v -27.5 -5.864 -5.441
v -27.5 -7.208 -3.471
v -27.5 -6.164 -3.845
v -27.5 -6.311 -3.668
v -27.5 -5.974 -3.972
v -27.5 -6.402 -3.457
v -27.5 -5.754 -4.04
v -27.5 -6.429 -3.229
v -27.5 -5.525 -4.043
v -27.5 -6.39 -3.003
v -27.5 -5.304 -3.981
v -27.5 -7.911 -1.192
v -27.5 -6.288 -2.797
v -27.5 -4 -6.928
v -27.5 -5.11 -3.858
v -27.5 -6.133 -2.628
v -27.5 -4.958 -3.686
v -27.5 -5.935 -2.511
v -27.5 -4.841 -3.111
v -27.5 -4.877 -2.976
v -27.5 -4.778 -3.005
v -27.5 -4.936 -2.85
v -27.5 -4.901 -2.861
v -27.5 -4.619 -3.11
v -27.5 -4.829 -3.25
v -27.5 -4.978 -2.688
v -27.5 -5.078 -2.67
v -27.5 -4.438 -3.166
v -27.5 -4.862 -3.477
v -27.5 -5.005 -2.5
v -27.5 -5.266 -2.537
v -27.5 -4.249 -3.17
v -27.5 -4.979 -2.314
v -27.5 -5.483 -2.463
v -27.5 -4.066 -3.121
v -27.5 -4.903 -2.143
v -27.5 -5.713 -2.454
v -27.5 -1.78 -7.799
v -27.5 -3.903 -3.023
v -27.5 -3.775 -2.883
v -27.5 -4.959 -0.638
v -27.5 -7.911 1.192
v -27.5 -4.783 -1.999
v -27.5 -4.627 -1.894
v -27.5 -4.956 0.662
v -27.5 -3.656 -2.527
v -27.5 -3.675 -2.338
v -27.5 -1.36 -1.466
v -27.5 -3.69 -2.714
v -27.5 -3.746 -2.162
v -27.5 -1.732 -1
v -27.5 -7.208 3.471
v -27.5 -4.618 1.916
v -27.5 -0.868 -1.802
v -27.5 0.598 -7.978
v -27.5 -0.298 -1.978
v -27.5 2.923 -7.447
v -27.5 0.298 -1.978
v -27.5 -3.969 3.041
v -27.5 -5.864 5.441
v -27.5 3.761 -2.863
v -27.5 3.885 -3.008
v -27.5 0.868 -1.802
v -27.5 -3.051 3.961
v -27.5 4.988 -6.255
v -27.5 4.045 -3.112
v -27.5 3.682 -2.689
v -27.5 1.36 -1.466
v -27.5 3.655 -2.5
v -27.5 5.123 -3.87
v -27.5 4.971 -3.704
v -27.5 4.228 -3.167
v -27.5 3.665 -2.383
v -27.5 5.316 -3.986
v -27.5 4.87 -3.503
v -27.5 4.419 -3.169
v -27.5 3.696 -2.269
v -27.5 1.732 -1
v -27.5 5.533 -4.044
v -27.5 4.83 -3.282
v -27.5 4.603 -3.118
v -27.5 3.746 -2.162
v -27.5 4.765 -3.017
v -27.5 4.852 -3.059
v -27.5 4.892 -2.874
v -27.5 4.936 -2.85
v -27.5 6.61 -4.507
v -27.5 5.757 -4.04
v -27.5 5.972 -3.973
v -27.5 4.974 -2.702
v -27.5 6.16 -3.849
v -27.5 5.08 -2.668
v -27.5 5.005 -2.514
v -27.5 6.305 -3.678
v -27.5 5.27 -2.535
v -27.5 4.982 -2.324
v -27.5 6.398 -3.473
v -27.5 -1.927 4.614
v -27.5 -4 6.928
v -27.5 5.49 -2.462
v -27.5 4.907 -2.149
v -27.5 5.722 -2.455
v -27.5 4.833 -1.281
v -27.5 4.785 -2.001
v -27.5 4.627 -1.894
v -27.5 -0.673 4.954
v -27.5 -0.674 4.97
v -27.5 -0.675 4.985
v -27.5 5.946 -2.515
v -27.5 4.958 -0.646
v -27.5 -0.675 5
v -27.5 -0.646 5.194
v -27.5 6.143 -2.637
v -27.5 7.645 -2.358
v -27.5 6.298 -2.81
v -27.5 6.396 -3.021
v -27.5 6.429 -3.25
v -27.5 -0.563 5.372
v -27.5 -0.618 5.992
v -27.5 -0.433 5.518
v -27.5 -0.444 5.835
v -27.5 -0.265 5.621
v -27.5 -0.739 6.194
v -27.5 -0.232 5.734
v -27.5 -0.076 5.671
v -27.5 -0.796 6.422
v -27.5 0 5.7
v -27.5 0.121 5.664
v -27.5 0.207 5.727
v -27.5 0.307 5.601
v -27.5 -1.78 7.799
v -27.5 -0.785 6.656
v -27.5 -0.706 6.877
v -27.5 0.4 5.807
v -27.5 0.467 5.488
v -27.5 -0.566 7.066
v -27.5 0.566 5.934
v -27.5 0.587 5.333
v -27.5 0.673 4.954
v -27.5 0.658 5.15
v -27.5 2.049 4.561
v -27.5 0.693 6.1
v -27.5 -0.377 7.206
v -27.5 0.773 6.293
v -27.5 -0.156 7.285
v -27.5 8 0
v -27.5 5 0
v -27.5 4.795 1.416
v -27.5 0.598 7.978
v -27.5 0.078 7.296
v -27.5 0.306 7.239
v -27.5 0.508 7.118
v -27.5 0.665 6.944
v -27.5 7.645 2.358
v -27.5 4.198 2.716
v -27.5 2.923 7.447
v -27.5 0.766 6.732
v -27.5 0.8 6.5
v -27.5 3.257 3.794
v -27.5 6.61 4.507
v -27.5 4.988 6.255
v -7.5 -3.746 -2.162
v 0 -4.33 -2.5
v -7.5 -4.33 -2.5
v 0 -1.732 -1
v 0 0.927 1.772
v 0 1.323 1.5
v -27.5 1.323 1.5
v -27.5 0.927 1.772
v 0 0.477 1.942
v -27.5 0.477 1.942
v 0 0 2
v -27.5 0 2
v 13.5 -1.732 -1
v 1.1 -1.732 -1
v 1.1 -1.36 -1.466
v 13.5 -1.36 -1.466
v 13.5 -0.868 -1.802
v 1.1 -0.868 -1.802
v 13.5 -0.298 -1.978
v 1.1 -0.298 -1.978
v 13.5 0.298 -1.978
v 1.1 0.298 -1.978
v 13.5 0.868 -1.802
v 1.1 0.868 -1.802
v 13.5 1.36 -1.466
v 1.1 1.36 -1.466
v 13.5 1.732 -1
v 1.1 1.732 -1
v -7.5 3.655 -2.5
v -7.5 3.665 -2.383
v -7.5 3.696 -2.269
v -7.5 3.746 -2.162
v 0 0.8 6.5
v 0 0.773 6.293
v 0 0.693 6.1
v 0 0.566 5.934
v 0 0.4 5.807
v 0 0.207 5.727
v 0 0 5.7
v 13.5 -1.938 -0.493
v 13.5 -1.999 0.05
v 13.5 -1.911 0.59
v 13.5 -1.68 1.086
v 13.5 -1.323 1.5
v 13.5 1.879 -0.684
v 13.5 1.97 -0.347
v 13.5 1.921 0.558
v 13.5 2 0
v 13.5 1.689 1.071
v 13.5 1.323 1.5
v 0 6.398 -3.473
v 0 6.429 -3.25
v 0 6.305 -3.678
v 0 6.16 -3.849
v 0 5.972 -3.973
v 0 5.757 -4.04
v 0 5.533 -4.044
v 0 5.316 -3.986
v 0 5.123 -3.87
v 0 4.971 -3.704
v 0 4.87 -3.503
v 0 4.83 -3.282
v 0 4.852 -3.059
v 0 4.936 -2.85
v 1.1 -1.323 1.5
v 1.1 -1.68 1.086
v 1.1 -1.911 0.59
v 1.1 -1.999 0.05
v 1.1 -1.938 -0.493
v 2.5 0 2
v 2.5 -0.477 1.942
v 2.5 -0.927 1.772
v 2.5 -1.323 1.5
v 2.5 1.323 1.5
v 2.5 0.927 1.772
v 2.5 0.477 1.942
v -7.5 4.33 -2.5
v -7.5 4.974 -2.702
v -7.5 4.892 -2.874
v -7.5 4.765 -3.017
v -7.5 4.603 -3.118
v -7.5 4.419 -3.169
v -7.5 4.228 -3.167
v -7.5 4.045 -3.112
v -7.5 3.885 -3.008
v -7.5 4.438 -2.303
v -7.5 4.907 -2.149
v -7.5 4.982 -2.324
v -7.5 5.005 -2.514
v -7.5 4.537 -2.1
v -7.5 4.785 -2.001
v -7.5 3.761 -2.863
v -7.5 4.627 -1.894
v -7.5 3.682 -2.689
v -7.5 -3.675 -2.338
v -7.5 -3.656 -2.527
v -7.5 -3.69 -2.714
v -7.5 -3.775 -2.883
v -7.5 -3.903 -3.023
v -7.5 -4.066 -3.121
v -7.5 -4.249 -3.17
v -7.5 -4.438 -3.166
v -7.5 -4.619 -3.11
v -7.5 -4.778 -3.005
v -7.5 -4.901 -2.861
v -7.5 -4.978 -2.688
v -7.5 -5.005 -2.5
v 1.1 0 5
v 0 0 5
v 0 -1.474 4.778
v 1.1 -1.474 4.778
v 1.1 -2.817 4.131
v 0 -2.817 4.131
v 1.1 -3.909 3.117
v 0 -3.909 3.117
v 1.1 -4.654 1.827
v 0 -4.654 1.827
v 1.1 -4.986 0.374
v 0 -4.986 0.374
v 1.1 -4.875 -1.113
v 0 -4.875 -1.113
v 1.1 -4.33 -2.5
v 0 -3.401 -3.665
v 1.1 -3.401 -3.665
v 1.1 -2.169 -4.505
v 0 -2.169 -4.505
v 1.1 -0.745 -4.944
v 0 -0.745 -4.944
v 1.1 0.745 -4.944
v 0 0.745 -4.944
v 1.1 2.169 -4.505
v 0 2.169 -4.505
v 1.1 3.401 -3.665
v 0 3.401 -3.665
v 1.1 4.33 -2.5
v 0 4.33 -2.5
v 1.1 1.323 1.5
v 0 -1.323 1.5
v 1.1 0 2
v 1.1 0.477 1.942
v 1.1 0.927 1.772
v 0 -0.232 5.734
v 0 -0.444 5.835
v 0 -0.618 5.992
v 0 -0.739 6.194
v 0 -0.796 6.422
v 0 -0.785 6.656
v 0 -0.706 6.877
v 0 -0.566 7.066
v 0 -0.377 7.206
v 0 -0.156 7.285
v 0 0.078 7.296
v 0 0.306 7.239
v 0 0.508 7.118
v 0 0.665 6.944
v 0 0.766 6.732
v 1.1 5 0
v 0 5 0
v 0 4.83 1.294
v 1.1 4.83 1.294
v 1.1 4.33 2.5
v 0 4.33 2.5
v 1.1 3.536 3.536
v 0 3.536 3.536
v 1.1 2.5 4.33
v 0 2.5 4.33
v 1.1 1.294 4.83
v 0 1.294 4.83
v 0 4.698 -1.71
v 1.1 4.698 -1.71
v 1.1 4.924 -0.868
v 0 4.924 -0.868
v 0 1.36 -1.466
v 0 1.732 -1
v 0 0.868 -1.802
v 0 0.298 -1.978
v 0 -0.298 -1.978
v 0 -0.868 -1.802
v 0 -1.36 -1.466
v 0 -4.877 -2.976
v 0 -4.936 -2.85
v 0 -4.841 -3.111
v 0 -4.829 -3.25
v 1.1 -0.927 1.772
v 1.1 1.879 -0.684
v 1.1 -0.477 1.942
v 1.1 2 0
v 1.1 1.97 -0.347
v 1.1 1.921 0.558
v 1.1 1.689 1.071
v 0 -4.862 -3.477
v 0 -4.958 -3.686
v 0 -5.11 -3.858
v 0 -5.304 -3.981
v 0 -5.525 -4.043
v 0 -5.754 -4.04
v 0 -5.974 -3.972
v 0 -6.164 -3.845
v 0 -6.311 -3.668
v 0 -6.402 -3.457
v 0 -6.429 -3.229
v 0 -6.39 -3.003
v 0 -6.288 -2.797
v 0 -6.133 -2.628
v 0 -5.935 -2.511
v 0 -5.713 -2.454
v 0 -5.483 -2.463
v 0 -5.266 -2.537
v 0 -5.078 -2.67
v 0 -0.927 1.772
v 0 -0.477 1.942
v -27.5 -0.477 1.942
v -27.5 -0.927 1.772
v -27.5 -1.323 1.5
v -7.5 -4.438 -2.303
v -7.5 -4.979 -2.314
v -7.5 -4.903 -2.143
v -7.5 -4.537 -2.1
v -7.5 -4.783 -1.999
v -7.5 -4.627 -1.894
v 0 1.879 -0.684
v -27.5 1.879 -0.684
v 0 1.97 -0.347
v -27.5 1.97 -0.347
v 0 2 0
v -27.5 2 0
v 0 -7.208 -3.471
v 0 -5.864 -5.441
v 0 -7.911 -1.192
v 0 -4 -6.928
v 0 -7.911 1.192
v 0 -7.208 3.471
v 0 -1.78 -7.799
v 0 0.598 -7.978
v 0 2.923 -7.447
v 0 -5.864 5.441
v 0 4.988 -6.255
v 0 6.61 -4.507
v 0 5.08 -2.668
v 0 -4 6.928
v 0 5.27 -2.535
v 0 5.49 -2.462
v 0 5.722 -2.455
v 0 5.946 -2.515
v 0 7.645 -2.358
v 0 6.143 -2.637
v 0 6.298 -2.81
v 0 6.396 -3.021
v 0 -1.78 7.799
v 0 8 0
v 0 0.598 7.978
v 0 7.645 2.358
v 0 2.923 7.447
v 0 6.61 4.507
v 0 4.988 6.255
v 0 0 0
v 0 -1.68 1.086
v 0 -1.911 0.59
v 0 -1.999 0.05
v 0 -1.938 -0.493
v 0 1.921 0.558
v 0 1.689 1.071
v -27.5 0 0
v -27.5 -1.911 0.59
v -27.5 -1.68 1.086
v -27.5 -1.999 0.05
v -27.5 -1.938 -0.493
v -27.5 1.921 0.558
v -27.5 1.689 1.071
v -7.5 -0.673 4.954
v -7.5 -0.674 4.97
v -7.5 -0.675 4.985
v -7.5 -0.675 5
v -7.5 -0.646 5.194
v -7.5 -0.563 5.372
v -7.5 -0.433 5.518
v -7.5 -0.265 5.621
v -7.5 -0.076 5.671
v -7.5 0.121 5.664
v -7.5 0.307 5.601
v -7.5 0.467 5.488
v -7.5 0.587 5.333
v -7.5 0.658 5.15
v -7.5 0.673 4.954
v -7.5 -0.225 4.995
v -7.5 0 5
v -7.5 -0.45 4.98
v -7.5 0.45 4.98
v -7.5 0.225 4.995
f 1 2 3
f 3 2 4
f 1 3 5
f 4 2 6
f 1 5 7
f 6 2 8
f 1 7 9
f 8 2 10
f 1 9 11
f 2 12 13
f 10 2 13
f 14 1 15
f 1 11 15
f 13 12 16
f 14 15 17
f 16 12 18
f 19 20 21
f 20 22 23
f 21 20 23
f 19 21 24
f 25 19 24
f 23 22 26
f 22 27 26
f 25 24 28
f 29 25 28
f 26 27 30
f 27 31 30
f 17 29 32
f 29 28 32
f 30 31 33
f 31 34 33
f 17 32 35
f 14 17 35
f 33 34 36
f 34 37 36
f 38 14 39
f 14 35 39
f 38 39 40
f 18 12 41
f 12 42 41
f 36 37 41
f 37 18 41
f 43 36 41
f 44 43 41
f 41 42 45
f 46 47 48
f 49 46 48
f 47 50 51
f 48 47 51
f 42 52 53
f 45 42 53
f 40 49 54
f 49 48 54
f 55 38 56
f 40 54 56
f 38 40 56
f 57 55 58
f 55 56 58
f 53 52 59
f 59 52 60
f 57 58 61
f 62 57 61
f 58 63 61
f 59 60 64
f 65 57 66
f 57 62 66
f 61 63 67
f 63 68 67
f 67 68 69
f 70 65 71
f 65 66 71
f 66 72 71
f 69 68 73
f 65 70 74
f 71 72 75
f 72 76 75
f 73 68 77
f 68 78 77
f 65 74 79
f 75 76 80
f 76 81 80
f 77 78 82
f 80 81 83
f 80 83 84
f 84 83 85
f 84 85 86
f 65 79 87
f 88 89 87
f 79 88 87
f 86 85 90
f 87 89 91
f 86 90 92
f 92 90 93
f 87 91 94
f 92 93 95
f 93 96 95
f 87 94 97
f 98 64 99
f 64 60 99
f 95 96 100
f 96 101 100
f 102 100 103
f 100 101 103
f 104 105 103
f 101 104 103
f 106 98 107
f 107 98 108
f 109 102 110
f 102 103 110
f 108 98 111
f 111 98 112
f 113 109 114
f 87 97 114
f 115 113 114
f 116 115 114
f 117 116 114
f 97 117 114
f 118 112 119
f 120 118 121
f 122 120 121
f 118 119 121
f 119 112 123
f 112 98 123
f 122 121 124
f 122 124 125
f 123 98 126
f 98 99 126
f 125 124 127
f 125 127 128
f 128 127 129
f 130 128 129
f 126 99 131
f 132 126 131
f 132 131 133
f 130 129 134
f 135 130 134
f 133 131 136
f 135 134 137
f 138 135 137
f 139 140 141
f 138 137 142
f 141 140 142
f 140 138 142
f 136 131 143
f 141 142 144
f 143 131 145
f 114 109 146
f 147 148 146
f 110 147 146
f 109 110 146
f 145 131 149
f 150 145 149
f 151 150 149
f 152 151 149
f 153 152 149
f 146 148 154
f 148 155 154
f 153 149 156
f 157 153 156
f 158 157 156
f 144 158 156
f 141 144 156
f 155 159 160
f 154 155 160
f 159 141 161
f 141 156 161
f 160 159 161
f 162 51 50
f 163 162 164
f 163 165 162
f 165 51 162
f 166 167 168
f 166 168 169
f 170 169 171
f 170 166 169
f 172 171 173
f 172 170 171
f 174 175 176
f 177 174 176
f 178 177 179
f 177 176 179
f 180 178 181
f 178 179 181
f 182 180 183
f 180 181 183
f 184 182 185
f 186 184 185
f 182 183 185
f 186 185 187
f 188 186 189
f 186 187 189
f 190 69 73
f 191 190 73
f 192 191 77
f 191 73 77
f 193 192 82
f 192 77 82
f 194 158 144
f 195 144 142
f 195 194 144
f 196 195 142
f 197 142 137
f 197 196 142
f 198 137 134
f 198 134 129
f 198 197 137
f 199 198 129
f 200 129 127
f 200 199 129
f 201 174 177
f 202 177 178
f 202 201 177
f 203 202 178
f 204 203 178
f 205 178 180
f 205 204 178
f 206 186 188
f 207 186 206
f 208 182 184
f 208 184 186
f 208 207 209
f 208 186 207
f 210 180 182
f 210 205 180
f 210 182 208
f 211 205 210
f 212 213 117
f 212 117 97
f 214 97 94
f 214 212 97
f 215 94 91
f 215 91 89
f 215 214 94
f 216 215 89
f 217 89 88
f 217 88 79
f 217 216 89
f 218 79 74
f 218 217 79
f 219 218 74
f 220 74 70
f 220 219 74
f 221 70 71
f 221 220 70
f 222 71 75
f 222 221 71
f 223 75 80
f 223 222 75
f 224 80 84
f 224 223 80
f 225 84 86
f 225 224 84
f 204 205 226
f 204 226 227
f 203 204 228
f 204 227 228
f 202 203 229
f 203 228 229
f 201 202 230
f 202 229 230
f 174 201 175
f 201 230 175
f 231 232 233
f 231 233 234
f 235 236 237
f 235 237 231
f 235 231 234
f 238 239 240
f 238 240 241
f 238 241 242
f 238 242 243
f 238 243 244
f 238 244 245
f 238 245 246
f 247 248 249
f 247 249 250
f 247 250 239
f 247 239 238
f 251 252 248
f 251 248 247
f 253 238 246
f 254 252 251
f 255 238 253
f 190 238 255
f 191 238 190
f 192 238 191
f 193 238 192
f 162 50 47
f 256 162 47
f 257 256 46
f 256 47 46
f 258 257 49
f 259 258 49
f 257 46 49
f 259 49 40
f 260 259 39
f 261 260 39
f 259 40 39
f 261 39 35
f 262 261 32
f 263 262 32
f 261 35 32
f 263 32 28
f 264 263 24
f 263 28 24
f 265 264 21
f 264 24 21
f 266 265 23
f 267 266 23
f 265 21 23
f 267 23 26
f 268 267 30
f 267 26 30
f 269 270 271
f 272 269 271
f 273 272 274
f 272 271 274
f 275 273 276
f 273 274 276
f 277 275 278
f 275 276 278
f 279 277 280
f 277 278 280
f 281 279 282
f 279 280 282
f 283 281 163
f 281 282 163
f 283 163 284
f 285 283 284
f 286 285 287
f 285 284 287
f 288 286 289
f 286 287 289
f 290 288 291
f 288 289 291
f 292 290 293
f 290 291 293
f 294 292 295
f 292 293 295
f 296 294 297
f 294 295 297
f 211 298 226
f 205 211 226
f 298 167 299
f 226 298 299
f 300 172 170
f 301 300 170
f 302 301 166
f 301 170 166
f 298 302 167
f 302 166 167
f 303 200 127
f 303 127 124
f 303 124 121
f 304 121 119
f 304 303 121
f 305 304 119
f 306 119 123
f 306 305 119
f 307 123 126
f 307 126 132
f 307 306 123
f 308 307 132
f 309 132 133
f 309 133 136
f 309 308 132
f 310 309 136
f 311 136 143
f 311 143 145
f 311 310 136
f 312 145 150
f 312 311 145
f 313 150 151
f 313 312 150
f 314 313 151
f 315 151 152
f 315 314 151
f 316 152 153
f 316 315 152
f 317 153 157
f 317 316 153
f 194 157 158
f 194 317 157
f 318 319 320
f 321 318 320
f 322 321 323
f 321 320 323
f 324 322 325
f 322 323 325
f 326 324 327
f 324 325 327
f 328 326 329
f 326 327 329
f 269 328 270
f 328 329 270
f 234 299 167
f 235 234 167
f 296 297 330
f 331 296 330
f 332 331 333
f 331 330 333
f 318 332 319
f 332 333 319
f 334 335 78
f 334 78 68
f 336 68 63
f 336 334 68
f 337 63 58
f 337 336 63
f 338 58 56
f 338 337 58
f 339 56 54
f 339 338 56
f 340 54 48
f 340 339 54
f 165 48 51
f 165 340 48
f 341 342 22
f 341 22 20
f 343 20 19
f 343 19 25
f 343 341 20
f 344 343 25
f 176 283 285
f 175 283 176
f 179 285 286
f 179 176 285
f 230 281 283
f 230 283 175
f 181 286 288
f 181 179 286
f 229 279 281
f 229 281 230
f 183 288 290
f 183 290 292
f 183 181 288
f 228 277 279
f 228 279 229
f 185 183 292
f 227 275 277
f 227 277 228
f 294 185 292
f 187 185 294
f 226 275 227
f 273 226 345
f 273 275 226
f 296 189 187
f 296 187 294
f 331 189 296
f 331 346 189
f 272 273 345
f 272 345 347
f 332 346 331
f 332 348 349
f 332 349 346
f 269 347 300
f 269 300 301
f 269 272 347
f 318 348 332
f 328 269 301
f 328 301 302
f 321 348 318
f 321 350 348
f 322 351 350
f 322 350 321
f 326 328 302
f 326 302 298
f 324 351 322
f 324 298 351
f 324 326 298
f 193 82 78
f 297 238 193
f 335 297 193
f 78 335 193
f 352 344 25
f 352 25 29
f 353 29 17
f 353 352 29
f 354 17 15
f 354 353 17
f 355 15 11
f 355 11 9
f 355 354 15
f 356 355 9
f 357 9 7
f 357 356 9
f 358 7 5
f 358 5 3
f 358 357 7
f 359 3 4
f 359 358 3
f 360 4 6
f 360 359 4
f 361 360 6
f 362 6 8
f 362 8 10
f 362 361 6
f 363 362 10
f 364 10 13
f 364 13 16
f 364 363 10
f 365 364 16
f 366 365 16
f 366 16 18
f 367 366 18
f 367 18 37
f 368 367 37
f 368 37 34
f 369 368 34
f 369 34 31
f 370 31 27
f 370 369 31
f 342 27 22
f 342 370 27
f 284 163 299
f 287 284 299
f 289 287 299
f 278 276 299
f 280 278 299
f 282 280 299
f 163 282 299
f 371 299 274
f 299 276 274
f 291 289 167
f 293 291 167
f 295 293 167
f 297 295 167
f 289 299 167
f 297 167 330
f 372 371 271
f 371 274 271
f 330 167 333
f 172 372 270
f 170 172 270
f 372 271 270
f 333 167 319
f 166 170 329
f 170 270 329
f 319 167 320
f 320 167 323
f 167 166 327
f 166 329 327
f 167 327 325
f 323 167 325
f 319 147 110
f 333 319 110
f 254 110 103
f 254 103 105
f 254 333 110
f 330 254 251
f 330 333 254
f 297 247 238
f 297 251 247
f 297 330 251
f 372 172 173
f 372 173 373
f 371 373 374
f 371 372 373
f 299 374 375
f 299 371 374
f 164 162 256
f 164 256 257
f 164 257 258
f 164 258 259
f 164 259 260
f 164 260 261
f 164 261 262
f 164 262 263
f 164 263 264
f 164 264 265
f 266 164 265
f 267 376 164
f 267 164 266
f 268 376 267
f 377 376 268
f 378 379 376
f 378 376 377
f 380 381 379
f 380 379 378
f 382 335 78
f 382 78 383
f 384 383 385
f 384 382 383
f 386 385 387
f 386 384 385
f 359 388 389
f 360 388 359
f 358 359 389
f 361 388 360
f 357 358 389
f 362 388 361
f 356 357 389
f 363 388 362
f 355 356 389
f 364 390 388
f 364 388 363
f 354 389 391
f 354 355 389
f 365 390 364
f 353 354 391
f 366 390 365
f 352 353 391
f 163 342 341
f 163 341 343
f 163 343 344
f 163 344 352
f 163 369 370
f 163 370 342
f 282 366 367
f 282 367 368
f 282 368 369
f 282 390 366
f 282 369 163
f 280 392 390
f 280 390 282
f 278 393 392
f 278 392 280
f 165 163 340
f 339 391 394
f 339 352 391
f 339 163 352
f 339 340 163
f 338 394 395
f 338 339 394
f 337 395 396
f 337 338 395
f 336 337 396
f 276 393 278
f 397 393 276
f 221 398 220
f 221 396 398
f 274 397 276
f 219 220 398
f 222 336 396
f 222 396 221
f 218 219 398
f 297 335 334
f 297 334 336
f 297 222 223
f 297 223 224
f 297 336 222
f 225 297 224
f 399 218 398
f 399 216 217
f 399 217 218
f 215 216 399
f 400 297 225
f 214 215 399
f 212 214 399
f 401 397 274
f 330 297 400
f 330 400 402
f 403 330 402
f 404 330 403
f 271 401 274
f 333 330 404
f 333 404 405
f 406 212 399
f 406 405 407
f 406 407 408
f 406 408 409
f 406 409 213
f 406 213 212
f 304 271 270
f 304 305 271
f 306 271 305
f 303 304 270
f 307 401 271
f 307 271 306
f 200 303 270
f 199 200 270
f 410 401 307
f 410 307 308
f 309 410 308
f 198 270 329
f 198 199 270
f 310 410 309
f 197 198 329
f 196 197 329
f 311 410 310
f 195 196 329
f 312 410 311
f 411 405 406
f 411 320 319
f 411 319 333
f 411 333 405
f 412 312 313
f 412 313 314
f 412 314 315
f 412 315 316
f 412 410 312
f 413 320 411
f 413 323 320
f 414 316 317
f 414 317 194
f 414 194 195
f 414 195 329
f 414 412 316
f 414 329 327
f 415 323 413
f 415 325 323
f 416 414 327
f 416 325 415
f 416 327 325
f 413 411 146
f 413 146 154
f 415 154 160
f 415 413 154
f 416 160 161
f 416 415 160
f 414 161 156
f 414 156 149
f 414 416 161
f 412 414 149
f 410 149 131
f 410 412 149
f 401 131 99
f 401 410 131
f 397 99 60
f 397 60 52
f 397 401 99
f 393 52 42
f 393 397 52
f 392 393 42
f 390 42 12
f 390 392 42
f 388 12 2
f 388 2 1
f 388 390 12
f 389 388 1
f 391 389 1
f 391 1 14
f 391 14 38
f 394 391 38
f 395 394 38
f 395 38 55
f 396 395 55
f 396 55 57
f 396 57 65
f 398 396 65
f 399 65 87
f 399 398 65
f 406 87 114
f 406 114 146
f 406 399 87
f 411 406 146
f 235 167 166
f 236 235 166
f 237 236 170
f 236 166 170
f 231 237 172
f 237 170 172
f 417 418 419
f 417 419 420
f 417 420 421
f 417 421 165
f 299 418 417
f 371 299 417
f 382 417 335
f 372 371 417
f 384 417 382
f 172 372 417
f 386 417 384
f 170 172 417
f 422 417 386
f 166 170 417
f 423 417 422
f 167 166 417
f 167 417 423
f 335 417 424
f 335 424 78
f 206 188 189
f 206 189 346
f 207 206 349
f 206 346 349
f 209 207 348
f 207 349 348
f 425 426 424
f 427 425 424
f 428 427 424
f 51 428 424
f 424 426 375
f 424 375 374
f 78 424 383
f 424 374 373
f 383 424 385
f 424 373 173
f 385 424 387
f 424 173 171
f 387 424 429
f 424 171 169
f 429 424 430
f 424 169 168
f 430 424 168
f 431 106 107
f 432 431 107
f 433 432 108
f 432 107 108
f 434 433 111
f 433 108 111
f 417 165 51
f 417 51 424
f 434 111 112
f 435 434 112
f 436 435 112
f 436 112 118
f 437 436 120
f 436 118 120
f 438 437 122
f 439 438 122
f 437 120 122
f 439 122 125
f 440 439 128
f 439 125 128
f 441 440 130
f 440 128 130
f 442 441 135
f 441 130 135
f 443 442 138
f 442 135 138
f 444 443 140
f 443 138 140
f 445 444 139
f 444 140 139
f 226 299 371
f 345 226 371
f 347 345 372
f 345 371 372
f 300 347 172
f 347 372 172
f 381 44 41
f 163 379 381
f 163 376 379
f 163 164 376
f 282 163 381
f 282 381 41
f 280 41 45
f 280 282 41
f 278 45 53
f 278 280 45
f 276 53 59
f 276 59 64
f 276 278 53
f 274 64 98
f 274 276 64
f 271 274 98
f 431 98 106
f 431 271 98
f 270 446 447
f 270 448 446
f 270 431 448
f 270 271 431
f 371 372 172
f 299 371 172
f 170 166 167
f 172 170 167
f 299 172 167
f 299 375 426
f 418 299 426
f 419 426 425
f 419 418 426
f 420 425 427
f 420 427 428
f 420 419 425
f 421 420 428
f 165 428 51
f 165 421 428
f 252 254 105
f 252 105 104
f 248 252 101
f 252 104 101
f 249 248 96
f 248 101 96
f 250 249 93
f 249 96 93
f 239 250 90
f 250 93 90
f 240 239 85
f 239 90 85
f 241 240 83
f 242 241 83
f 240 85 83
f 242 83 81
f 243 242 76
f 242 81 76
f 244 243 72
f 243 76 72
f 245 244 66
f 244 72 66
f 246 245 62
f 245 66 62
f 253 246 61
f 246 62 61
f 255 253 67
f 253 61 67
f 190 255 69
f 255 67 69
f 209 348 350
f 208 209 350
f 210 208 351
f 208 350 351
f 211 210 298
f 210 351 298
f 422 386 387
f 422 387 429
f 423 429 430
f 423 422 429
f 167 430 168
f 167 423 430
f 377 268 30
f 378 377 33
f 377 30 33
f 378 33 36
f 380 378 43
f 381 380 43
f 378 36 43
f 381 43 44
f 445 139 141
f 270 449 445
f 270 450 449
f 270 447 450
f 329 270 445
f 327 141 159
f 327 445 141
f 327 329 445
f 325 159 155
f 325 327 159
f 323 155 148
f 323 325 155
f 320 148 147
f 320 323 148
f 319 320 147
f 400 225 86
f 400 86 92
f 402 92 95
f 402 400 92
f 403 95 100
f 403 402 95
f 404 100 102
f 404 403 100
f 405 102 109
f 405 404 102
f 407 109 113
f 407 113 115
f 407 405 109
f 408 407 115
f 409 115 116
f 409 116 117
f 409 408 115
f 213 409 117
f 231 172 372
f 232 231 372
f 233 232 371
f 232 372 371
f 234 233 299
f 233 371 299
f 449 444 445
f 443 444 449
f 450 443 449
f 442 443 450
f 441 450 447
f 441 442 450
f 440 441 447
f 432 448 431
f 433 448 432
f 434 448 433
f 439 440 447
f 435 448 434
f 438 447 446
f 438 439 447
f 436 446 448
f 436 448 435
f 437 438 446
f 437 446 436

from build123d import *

# Parameters (mm, degrees)
F1_DEPTH = 13.5
F2_DEPTH = 1.1
F0_R     = 8
F3_DEPTH = 27.5
F6_DEPTH = 20
F7_DEPTH = 2.5


# Not quite as in the source:
# - a feature of the source that left no trace in its solid (it failed there, or was rolled back) is left out


with BuildPart() as f1:
    # F0 (on Right) → F1 (new body)
    with BuildSketch(Plane.YZ):
        with BuildLine():
            ThreePointArc((-1.3228756555, 1.5), (-1.9737385652, 0.323041911), (-1.7320508076, -1))
            Line((-1.7320508076, -1), (0, 0))
            Line((0, 0), (0, 1.5))
            Line((0, 1.5), (-1.3228756555, 1.5))
        make_face()
        with BuildLine():
            Line((0, 0), (1.7320508076, -1))
            ThreePointArc((1.7320508076, -1), (1.9318516526, -0.5176380902), (2, 0))
            ThreePointArc((2, 0), (1.8228756555, 0.8228756555), (1.3228756555, 1.5))
            Line((1.3228756555, 1.5), (0, 1.5))
            Line((0, 1.5), (0, 0))
        make_face()
        with BuildLine():
            ThreePointArc((-1.7320508076, -1), (0, -2), (1.7320508076, -1))
            Line((1.7320508076, -1), (0, 0))
            Line((0, 0), (-1.7320508076, -1))
        make_face()
    extrude(amount=F1_DEPTH)

    # F0 (on Right) → F2 (join)
    with BuildSketch(Plane.YZ):
        with BuildLine():
            Line((0, 2), (0, 5))
            ThreePointArc((0, 5), (-4.3301270189, 2.5), (-4.3301270189, -2.5))
            Line((-4.3301270189, -2.5), (-1.7320508076, -1))
            ThreePointArc((-1.7320508076, -1), (-1.9737385652, 0.323041911), (-1.3228756555, 1.5))
            ThreePointArc((-1.3228756555, 1.5), (-0.7071067812, 1.8708286934), (0, 2))
        make_face()
        with BuildLine():
            ThreePointArc((-4.3301270189, -2.5), (0, -5), (4.3301270189, -2.5))
            Line((4.3301270189, -2.5), (1.7320508076, -1))
            ThreePointArc((1.7320508076, -1), (0, -2), (-1.7320508076, -1))
            Line((-1.7320508076, -1), (-4.3301270189, -2.5))
        make_face()
        with BuildLine():
            ThreePointArc((4.3301270189, -2.5), (4.8296291314, -1.2940952255), (5, 0))
            ThreePointArc((5, 0), (3.5355339059, 3.5355339059), (0, 5))
            Line((0, 5), (0, 2))
            ThreePointArc((0, 2), (0.7071067812, 1.8708286934), (1.3228756555, 1.5))
            ThreePointArc((1.3228756555, 1.5), (1.8228756555, 0.8228756555), (2, 0))
            ThreePointArc((2, 0), (1.9318516526, -0.5176380902), (1.7320508076, -1))
            Line((1.7320508076, -1), (4.3301270189, -2.5))
        make_face()
    extrude(amount=F2_DEPTH)


with BuildPart() as f3:
    # F0 (on Right) → F3 (new body)
    with BuildSketch(Plane.YZ):
        Circle(F0_R)
        with BuildLine():
            ThreePointArc((-4.8291651246, -3.25), (-6.4019057856, -3.4570552361), (-4.9363448016, -2.85))
            ThreePointArc((-4.9363448016, -2.85), (-4.8564244636, -3.0429447639), (-4.8291651246, -3.25))
        make_face(mode=Mode.SUBTRACT)
        with BuildLine():
            ThreePointArc((6.4291651246, -3.25), (5.4221098885, -4.022740661), (4.9363448016, -2.85))
            ThreePointArc((4.9363448016, -2.85), (5.8362203607, -2.477259339), (6.4291651246, -3.25))
        make_face(mode=Mode.SUBTRACT)
        with BuildLine():
            ThreePointArc((0, 5), (3.5355339059, 3.5355339059), (5, 0))
            ThreePointArc((5, 0), (4.8296291314, -1.2940952255), (4.3301270189, -2.5))
            ThreePointArc((4.3301270189, -2.5), (0, -5), (-4.3301270189, -2.5))
            ThreePointArc((-4.3301270189, -2.5), (-4.3301270189, 2.5), (0, 5))
        make_face(mode=Mode.SUBTRACT)
        with BuildLine():
            ThreePointArc((0.8, 6.5), (0.5656854249, 5.9343145751), (0, 5.7))
            ThreePointArc((0, 5.7), (-0.5656854249, 7.0656854249), (0.8, 6.5))
        make_face(mode=Mode.SUBTRACT)
        with BuildLine():
            ThreePointArc((-4.3301270189, -2.5), (0, -5), (4.3301270189, -2.5))
            Line((4.3301270189, -2.5), (1.7320508076, -1))
            ThreePointArc((1.7320508076, -1), (0, -2), (-1.7320508076, -1))
            Line((-1.7320508076, -1), (-4.3301270189, -2.5))
        make_face()
    extrude(amount=-F3_DEPTH)

    # F4 (on face) → F6 (cut)
    with BuildSketch(Plane(origin=(-27.5, 0, 0), x_dir=(0, -1, 0), z_dir=(-1, 0, 0))):
        with BuildLine():
            ThreePointArc((-3.7455598714, -2.1625), (-4.1335062489, -1.8542715177), (-4.6273989915, -1.8939848399))
            ThreePointArc((-4.6273989915, -1.8939848399), (-4.4890011863, -2.2020146116), (-4.3301270189, -2.5))
            Line((-4.3301270189, -2.5), (-3.7455598714, -2.1625))
        make_face()
        with BuildLine():
            ThreePointArc((-4.3301270189, -2.5), (-4.4890011863, -2.2020146116), (-4.6273989915, -1.8939848399))
            ThreePointArc((-4.6273989915, -1.8939848399), (-4.6871749278, -3.0728366178), (-3.6551270189, -2.5))
            ThreePointArc((-3.6551270189, -2.5), (-3.6781270862, -2.3252971446), (-3.7455598714, -2.1625))
            Line((-3.7455598714, -2.1625), (-4.3301270189, -2.5))
        make_face()
        with BuildLine():
            ThreePointArc((0.67346051, 4.9544375), (0, 5), (-0.67346051, 4.9544375))
            ThreePointArc((-0.67346051, 4.9544375), (0, 4.325), (0.67346051, 4.9544375))
        make_face()
        with BuildLine():
            ThreePointArc((0.67346051, 4.9544375), (0.6746150177, 4.9772057494), (0.675, 5))
            ThreePointArc((0.675, 5), (-0.0227942506, 5.6746150177), (-0.67346051, 4.9544375))
            ThreePointArc((-0.67346051, 4.9544375), (0, 5), (0.67346051, 4.9544375))
        make_face()
        with BuildLine():
            ThreePointArc((4.3301270189, -2.5), (4.4890011863, -2.2020146116), (4.6273989915, -1.8939848399))
            ThreePointArc((4.6273989915, -1.8939848399), (4.1335062489, -1.8542715177), (3.7455598714, -2.1625))
            Line((3.7455598714, -2.1625), (4.3301270189, -2.5))
        make_face()
        with BuildLine():
            ThreePointArc((5.0051270189, -2.5), (4.9029636368, -2.1429520911), (4.6273989915, -1.8939848399))
            ThreePointArc((4.6273989915, -1.8939848399), (4.4890011863, -2.2020146116), (4.3301270189, -2.5))
            Line((4.3301270189, -2.5), (3.7455598714, -2.1625))
            ThreePointArc((3.7455598714, -2.1625), (4.1554241635, -3.1519999327), (5.0051270189, -2.5))
        make_face()
    extrude(amount=-F6_DEPTH, mode=Mode.SUBTRACT)


with BuildPart() as f3b:
    # F0 (on Right) → F3, piece 2 (new body)
    with BuildSketch(Plane.YZ):
        with BuildLine():
            Line((0, 1.5), (0, 2))
            ThreePointArc((0, 2), (-0.7071067812, 1.8708286934), (-1.3228756555, 1.5))
            Line((-1.3228756555, 1.5), (0, 1.5))
        make_face()
        with BuildLine():
            ThreePointArc((1.3228756555, 1.5), (0.7071067812, 1.8708286934), (0, 2))
            Line((0, 2), (0, 1.5))
            Line((0, 1.5), (1.3228756555, 1.5))
        make_face()
        with BuildLine():
            Line((0, 0), (1.7320508076, -1))
            ThreePointArc((1.7320508076, -1), (1.9318516526, -0.5176380902), (2, 0))
            ThreePointArc((2, 0), (1.8228756555, 0.8228756555), (1.3228756555, 1.5))
            Line((1.3228756555, 1.5), (0, 1.5))
            Line((0, 1.5), (0, 0))
        make_face()
        with BuildLine():
            ThreePointArc((-1.3228756555, 1.5), (-1.9737385652, 0.323041911), (-1.7320508076, -1))
            Line((-1.7320508076, -1), (0, 0))
            Line((0, 0), (0, 1.5))
            Line((0, 1.5), (-1.3228756555, 1.5))
        make_face()
    extrude(amount=-F3_DEPTH)


with BuildPart() as f7:
    # F0 (on Right) → F7 (new body)
    with BuildSketch(Plane.YZ):
        with BuildLine():
            Line((0, 1.5), (0, 2))
            ThreePointArc((0, 2), (-0.7071067812, 1.8708286934), (-1.3228756555, 1.5))
            Line((-1.3228756555, 1.5), (0, 1.5))
        make_face()
        with BuildLine():
            ThreePointArc((1.3228756555, 1.5), (0.7071067812, 1.8708286934), (0, 2))
            Line((0, 2), (0, 1.5))
            Line((0, 1.5), (1.3228756555, 1.5))
        make_face()
    extrude(amount=F7_DEPTH)


solid = Compound([f1.part, f3.part, f3b.part, f7.part])
